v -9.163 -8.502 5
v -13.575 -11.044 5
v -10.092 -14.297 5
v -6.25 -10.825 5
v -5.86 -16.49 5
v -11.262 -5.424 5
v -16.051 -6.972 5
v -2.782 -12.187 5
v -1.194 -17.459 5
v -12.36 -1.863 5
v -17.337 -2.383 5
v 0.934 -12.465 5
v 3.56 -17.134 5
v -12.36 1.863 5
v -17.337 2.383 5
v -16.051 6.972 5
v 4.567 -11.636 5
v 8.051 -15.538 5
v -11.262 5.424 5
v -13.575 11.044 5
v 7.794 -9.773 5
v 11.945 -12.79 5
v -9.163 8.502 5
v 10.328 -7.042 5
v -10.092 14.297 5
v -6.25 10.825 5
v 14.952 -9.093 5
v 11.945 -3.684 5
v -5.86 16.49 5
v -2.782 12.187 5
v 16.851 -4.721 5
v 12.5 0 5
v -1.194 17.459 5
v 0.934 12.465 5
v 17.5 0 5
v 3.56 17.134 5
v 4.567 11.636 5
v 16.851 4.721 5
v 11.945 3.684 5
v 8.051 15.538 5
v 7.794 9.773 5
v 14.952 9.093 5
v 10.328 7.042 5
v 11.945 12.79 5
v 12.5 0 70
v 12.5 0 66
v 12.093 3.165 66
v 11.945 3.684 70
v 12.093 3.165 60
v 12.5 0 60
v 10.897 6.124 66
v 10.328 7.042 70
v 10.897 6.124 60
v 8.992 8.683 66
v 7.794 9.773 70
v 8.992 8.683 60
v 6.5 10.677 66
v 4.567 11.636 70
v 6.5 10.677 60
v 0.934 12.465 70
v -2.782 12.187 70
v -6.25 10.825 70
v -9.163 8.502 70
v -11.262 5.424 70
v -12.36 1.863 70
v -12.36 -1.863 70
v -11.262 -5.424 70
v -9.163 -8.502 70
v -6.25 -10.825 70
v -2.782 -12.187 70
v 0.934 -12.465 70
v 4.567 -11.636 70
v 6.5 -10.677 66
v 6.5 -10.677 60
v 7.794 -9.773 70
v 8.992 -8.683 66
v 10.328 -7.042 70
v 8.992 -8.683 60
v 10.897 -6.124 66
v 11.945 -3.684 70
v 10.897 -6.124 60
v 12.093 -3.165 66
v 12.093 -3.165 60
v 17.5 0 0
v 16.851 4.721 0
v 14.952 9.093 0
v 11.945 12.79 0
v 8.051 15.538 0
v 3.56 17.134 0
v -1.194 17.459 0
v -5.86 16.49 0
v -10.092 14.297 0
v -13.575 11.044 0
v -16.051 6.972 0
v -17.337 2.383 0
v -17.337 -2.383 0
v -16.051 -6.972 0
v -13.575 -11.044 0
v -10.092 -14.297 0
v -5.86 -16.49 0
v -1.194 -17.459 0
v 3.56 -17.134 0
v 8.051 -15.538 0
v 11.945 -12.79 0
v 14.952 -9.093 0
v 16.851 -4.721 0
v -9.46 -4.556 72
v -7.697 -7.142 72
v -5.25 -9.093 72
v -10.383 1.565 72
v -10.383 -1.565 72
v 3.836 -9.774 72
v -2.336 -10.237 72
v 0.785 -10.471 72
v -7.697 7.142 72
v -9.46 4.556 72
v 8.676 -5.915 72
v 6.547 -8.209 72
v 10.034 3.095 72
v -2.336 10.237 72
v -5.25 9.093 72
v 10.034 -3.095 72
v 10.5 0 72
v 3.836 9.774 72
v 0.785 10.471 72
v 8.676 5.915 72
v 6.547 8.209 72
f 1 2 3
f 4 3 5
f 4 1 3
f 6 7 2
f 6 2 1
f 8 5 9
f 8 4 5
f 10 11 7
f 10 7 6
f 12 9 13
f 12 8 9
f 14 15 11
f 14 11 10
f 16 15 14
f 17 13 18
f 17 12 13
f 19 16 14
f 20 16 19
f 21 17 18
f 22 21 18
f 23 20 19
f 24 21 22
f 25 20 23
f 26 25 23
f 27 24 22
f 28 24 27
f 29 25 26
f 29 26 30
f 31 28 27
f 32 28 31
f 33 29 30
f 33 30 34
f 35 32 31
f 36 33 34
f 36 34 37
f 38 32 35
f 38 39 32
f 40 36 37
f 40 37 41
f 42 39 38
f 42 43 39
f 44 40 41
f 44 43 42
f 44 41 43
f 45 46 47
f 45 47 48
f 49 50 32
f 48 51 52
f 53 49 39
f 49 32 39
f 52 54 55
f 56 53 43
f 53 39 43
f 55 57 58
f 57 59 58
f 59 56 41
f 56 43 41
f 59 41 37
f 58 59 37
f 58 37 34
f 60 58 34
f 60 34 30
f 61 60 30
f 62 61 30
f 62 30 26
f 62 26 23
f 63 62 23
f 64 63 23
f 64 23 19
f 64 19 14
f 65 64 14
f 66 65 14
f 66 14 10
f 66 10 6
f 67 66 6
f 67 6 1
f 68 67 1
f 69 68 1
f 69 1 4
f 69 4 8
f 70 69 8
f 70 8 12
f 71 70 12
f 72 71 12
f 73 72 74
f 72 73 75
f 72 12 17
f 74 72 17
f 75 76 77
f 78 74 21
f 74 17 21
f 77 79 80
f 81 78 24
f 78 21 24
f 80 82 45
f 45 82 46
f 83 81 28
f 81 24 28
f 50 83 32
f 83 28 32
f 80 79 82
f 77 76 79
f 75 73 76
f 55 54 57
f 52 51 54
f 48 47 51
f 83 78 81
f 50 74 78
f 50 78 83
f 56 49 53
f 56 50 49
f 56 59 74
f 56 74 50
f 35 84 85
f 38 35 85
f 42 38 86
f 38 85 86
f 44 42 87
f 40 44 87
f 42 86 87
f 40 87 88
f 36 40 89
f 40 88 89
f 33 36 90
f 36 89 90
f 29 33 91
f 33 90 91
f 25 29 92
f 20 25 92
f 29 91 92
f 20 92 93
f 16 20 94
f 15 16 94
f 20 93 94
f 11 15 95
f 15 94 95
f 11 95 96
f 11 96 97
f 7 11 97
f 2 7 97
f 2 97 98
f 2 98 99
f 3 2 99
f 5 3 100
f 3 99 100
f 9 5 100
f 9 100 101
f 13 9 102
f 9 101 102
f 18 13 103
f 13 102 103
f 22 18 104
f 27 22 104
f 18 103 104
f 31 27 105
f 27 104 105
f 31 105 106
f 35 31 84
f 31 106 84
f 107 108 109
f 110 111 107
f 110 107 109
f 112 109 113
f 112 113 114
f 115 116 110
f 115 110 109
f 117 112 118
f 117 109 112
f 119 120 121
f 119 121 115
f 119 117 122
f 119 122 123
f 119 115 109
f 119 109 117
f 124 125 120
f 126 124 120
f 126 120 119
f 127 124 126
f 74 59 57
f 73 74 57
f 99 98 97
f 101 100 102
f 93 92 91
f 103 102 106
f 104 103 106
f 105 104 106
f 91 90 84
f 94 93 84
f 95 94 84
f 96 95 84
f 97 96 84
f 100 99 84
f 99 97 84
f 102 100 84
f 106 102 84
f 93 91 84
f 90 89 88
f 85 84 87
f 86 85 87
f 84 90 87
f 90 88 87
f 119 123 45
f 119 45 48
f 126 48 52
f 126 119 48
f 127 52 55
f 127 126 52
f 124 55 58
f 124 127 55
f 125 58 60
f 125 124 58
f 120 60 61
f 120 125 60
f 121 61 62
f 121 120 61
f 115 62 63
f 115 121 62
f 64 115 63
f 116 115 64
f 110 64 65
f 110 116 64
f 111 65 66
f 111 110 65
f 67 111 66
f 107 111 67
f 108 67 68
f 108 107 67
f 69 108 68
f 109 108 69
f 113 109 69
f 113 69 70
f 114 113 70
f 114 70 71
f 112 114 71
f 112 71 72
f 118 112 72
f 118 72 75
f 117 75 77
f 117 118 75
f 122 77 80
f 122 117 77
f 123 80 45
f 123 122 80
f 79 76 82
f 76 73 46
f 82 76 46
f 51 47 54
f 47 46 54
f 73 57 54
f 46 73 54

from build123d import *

# Parameters (mm, degrees)
F0_R          = 17.5
F1_DEPTH      = 5
F2_R          = 12.5
F3_DEPTH      = 72
F4_W          = 10
F4_H          = 6
F5_DEPTH      = 17.501
F5_DEPTH_BACK = 17.501
F6_SIZE2      = 2
F6_SIZE       = 2


with BuildPart() as f1:
    # F0 (on Top) → F1 (new body)
    with BuildSketch(Plane.XY):
        Circle(F0_R)
    extrude(amount=F1_DEPTH)

    # F2 (on Top) → F3 (join)
    with BuildSketch(Plane.XY):
        Circle(F2_R)
    extrude(amount=F3_DEPTH)

    # F4 (on Front) → F5 (cut, two sides)
    with BuildSketch(Plane.XZ) as f5_sk:
        with Locations((11.5, 63)):
            Rectangle(F4_W, F4_H)
    extrude(amount=-F5_DEPTH, mode=Mode.SUBTRACT)
    extrude(f5_sk.sketch, amount=F5_DEPTH_BACK, mode=Mode.SUBTRACT)

    # F6
    f6_edges = [f1.edges().sort_by_distance(p)[0] for p in [
        (-12.5, 0, 72),
    ]]
    chamfer(f6_edges, length=F6_SIZE, length2=F6_SIZE2)


solid = f1.part
